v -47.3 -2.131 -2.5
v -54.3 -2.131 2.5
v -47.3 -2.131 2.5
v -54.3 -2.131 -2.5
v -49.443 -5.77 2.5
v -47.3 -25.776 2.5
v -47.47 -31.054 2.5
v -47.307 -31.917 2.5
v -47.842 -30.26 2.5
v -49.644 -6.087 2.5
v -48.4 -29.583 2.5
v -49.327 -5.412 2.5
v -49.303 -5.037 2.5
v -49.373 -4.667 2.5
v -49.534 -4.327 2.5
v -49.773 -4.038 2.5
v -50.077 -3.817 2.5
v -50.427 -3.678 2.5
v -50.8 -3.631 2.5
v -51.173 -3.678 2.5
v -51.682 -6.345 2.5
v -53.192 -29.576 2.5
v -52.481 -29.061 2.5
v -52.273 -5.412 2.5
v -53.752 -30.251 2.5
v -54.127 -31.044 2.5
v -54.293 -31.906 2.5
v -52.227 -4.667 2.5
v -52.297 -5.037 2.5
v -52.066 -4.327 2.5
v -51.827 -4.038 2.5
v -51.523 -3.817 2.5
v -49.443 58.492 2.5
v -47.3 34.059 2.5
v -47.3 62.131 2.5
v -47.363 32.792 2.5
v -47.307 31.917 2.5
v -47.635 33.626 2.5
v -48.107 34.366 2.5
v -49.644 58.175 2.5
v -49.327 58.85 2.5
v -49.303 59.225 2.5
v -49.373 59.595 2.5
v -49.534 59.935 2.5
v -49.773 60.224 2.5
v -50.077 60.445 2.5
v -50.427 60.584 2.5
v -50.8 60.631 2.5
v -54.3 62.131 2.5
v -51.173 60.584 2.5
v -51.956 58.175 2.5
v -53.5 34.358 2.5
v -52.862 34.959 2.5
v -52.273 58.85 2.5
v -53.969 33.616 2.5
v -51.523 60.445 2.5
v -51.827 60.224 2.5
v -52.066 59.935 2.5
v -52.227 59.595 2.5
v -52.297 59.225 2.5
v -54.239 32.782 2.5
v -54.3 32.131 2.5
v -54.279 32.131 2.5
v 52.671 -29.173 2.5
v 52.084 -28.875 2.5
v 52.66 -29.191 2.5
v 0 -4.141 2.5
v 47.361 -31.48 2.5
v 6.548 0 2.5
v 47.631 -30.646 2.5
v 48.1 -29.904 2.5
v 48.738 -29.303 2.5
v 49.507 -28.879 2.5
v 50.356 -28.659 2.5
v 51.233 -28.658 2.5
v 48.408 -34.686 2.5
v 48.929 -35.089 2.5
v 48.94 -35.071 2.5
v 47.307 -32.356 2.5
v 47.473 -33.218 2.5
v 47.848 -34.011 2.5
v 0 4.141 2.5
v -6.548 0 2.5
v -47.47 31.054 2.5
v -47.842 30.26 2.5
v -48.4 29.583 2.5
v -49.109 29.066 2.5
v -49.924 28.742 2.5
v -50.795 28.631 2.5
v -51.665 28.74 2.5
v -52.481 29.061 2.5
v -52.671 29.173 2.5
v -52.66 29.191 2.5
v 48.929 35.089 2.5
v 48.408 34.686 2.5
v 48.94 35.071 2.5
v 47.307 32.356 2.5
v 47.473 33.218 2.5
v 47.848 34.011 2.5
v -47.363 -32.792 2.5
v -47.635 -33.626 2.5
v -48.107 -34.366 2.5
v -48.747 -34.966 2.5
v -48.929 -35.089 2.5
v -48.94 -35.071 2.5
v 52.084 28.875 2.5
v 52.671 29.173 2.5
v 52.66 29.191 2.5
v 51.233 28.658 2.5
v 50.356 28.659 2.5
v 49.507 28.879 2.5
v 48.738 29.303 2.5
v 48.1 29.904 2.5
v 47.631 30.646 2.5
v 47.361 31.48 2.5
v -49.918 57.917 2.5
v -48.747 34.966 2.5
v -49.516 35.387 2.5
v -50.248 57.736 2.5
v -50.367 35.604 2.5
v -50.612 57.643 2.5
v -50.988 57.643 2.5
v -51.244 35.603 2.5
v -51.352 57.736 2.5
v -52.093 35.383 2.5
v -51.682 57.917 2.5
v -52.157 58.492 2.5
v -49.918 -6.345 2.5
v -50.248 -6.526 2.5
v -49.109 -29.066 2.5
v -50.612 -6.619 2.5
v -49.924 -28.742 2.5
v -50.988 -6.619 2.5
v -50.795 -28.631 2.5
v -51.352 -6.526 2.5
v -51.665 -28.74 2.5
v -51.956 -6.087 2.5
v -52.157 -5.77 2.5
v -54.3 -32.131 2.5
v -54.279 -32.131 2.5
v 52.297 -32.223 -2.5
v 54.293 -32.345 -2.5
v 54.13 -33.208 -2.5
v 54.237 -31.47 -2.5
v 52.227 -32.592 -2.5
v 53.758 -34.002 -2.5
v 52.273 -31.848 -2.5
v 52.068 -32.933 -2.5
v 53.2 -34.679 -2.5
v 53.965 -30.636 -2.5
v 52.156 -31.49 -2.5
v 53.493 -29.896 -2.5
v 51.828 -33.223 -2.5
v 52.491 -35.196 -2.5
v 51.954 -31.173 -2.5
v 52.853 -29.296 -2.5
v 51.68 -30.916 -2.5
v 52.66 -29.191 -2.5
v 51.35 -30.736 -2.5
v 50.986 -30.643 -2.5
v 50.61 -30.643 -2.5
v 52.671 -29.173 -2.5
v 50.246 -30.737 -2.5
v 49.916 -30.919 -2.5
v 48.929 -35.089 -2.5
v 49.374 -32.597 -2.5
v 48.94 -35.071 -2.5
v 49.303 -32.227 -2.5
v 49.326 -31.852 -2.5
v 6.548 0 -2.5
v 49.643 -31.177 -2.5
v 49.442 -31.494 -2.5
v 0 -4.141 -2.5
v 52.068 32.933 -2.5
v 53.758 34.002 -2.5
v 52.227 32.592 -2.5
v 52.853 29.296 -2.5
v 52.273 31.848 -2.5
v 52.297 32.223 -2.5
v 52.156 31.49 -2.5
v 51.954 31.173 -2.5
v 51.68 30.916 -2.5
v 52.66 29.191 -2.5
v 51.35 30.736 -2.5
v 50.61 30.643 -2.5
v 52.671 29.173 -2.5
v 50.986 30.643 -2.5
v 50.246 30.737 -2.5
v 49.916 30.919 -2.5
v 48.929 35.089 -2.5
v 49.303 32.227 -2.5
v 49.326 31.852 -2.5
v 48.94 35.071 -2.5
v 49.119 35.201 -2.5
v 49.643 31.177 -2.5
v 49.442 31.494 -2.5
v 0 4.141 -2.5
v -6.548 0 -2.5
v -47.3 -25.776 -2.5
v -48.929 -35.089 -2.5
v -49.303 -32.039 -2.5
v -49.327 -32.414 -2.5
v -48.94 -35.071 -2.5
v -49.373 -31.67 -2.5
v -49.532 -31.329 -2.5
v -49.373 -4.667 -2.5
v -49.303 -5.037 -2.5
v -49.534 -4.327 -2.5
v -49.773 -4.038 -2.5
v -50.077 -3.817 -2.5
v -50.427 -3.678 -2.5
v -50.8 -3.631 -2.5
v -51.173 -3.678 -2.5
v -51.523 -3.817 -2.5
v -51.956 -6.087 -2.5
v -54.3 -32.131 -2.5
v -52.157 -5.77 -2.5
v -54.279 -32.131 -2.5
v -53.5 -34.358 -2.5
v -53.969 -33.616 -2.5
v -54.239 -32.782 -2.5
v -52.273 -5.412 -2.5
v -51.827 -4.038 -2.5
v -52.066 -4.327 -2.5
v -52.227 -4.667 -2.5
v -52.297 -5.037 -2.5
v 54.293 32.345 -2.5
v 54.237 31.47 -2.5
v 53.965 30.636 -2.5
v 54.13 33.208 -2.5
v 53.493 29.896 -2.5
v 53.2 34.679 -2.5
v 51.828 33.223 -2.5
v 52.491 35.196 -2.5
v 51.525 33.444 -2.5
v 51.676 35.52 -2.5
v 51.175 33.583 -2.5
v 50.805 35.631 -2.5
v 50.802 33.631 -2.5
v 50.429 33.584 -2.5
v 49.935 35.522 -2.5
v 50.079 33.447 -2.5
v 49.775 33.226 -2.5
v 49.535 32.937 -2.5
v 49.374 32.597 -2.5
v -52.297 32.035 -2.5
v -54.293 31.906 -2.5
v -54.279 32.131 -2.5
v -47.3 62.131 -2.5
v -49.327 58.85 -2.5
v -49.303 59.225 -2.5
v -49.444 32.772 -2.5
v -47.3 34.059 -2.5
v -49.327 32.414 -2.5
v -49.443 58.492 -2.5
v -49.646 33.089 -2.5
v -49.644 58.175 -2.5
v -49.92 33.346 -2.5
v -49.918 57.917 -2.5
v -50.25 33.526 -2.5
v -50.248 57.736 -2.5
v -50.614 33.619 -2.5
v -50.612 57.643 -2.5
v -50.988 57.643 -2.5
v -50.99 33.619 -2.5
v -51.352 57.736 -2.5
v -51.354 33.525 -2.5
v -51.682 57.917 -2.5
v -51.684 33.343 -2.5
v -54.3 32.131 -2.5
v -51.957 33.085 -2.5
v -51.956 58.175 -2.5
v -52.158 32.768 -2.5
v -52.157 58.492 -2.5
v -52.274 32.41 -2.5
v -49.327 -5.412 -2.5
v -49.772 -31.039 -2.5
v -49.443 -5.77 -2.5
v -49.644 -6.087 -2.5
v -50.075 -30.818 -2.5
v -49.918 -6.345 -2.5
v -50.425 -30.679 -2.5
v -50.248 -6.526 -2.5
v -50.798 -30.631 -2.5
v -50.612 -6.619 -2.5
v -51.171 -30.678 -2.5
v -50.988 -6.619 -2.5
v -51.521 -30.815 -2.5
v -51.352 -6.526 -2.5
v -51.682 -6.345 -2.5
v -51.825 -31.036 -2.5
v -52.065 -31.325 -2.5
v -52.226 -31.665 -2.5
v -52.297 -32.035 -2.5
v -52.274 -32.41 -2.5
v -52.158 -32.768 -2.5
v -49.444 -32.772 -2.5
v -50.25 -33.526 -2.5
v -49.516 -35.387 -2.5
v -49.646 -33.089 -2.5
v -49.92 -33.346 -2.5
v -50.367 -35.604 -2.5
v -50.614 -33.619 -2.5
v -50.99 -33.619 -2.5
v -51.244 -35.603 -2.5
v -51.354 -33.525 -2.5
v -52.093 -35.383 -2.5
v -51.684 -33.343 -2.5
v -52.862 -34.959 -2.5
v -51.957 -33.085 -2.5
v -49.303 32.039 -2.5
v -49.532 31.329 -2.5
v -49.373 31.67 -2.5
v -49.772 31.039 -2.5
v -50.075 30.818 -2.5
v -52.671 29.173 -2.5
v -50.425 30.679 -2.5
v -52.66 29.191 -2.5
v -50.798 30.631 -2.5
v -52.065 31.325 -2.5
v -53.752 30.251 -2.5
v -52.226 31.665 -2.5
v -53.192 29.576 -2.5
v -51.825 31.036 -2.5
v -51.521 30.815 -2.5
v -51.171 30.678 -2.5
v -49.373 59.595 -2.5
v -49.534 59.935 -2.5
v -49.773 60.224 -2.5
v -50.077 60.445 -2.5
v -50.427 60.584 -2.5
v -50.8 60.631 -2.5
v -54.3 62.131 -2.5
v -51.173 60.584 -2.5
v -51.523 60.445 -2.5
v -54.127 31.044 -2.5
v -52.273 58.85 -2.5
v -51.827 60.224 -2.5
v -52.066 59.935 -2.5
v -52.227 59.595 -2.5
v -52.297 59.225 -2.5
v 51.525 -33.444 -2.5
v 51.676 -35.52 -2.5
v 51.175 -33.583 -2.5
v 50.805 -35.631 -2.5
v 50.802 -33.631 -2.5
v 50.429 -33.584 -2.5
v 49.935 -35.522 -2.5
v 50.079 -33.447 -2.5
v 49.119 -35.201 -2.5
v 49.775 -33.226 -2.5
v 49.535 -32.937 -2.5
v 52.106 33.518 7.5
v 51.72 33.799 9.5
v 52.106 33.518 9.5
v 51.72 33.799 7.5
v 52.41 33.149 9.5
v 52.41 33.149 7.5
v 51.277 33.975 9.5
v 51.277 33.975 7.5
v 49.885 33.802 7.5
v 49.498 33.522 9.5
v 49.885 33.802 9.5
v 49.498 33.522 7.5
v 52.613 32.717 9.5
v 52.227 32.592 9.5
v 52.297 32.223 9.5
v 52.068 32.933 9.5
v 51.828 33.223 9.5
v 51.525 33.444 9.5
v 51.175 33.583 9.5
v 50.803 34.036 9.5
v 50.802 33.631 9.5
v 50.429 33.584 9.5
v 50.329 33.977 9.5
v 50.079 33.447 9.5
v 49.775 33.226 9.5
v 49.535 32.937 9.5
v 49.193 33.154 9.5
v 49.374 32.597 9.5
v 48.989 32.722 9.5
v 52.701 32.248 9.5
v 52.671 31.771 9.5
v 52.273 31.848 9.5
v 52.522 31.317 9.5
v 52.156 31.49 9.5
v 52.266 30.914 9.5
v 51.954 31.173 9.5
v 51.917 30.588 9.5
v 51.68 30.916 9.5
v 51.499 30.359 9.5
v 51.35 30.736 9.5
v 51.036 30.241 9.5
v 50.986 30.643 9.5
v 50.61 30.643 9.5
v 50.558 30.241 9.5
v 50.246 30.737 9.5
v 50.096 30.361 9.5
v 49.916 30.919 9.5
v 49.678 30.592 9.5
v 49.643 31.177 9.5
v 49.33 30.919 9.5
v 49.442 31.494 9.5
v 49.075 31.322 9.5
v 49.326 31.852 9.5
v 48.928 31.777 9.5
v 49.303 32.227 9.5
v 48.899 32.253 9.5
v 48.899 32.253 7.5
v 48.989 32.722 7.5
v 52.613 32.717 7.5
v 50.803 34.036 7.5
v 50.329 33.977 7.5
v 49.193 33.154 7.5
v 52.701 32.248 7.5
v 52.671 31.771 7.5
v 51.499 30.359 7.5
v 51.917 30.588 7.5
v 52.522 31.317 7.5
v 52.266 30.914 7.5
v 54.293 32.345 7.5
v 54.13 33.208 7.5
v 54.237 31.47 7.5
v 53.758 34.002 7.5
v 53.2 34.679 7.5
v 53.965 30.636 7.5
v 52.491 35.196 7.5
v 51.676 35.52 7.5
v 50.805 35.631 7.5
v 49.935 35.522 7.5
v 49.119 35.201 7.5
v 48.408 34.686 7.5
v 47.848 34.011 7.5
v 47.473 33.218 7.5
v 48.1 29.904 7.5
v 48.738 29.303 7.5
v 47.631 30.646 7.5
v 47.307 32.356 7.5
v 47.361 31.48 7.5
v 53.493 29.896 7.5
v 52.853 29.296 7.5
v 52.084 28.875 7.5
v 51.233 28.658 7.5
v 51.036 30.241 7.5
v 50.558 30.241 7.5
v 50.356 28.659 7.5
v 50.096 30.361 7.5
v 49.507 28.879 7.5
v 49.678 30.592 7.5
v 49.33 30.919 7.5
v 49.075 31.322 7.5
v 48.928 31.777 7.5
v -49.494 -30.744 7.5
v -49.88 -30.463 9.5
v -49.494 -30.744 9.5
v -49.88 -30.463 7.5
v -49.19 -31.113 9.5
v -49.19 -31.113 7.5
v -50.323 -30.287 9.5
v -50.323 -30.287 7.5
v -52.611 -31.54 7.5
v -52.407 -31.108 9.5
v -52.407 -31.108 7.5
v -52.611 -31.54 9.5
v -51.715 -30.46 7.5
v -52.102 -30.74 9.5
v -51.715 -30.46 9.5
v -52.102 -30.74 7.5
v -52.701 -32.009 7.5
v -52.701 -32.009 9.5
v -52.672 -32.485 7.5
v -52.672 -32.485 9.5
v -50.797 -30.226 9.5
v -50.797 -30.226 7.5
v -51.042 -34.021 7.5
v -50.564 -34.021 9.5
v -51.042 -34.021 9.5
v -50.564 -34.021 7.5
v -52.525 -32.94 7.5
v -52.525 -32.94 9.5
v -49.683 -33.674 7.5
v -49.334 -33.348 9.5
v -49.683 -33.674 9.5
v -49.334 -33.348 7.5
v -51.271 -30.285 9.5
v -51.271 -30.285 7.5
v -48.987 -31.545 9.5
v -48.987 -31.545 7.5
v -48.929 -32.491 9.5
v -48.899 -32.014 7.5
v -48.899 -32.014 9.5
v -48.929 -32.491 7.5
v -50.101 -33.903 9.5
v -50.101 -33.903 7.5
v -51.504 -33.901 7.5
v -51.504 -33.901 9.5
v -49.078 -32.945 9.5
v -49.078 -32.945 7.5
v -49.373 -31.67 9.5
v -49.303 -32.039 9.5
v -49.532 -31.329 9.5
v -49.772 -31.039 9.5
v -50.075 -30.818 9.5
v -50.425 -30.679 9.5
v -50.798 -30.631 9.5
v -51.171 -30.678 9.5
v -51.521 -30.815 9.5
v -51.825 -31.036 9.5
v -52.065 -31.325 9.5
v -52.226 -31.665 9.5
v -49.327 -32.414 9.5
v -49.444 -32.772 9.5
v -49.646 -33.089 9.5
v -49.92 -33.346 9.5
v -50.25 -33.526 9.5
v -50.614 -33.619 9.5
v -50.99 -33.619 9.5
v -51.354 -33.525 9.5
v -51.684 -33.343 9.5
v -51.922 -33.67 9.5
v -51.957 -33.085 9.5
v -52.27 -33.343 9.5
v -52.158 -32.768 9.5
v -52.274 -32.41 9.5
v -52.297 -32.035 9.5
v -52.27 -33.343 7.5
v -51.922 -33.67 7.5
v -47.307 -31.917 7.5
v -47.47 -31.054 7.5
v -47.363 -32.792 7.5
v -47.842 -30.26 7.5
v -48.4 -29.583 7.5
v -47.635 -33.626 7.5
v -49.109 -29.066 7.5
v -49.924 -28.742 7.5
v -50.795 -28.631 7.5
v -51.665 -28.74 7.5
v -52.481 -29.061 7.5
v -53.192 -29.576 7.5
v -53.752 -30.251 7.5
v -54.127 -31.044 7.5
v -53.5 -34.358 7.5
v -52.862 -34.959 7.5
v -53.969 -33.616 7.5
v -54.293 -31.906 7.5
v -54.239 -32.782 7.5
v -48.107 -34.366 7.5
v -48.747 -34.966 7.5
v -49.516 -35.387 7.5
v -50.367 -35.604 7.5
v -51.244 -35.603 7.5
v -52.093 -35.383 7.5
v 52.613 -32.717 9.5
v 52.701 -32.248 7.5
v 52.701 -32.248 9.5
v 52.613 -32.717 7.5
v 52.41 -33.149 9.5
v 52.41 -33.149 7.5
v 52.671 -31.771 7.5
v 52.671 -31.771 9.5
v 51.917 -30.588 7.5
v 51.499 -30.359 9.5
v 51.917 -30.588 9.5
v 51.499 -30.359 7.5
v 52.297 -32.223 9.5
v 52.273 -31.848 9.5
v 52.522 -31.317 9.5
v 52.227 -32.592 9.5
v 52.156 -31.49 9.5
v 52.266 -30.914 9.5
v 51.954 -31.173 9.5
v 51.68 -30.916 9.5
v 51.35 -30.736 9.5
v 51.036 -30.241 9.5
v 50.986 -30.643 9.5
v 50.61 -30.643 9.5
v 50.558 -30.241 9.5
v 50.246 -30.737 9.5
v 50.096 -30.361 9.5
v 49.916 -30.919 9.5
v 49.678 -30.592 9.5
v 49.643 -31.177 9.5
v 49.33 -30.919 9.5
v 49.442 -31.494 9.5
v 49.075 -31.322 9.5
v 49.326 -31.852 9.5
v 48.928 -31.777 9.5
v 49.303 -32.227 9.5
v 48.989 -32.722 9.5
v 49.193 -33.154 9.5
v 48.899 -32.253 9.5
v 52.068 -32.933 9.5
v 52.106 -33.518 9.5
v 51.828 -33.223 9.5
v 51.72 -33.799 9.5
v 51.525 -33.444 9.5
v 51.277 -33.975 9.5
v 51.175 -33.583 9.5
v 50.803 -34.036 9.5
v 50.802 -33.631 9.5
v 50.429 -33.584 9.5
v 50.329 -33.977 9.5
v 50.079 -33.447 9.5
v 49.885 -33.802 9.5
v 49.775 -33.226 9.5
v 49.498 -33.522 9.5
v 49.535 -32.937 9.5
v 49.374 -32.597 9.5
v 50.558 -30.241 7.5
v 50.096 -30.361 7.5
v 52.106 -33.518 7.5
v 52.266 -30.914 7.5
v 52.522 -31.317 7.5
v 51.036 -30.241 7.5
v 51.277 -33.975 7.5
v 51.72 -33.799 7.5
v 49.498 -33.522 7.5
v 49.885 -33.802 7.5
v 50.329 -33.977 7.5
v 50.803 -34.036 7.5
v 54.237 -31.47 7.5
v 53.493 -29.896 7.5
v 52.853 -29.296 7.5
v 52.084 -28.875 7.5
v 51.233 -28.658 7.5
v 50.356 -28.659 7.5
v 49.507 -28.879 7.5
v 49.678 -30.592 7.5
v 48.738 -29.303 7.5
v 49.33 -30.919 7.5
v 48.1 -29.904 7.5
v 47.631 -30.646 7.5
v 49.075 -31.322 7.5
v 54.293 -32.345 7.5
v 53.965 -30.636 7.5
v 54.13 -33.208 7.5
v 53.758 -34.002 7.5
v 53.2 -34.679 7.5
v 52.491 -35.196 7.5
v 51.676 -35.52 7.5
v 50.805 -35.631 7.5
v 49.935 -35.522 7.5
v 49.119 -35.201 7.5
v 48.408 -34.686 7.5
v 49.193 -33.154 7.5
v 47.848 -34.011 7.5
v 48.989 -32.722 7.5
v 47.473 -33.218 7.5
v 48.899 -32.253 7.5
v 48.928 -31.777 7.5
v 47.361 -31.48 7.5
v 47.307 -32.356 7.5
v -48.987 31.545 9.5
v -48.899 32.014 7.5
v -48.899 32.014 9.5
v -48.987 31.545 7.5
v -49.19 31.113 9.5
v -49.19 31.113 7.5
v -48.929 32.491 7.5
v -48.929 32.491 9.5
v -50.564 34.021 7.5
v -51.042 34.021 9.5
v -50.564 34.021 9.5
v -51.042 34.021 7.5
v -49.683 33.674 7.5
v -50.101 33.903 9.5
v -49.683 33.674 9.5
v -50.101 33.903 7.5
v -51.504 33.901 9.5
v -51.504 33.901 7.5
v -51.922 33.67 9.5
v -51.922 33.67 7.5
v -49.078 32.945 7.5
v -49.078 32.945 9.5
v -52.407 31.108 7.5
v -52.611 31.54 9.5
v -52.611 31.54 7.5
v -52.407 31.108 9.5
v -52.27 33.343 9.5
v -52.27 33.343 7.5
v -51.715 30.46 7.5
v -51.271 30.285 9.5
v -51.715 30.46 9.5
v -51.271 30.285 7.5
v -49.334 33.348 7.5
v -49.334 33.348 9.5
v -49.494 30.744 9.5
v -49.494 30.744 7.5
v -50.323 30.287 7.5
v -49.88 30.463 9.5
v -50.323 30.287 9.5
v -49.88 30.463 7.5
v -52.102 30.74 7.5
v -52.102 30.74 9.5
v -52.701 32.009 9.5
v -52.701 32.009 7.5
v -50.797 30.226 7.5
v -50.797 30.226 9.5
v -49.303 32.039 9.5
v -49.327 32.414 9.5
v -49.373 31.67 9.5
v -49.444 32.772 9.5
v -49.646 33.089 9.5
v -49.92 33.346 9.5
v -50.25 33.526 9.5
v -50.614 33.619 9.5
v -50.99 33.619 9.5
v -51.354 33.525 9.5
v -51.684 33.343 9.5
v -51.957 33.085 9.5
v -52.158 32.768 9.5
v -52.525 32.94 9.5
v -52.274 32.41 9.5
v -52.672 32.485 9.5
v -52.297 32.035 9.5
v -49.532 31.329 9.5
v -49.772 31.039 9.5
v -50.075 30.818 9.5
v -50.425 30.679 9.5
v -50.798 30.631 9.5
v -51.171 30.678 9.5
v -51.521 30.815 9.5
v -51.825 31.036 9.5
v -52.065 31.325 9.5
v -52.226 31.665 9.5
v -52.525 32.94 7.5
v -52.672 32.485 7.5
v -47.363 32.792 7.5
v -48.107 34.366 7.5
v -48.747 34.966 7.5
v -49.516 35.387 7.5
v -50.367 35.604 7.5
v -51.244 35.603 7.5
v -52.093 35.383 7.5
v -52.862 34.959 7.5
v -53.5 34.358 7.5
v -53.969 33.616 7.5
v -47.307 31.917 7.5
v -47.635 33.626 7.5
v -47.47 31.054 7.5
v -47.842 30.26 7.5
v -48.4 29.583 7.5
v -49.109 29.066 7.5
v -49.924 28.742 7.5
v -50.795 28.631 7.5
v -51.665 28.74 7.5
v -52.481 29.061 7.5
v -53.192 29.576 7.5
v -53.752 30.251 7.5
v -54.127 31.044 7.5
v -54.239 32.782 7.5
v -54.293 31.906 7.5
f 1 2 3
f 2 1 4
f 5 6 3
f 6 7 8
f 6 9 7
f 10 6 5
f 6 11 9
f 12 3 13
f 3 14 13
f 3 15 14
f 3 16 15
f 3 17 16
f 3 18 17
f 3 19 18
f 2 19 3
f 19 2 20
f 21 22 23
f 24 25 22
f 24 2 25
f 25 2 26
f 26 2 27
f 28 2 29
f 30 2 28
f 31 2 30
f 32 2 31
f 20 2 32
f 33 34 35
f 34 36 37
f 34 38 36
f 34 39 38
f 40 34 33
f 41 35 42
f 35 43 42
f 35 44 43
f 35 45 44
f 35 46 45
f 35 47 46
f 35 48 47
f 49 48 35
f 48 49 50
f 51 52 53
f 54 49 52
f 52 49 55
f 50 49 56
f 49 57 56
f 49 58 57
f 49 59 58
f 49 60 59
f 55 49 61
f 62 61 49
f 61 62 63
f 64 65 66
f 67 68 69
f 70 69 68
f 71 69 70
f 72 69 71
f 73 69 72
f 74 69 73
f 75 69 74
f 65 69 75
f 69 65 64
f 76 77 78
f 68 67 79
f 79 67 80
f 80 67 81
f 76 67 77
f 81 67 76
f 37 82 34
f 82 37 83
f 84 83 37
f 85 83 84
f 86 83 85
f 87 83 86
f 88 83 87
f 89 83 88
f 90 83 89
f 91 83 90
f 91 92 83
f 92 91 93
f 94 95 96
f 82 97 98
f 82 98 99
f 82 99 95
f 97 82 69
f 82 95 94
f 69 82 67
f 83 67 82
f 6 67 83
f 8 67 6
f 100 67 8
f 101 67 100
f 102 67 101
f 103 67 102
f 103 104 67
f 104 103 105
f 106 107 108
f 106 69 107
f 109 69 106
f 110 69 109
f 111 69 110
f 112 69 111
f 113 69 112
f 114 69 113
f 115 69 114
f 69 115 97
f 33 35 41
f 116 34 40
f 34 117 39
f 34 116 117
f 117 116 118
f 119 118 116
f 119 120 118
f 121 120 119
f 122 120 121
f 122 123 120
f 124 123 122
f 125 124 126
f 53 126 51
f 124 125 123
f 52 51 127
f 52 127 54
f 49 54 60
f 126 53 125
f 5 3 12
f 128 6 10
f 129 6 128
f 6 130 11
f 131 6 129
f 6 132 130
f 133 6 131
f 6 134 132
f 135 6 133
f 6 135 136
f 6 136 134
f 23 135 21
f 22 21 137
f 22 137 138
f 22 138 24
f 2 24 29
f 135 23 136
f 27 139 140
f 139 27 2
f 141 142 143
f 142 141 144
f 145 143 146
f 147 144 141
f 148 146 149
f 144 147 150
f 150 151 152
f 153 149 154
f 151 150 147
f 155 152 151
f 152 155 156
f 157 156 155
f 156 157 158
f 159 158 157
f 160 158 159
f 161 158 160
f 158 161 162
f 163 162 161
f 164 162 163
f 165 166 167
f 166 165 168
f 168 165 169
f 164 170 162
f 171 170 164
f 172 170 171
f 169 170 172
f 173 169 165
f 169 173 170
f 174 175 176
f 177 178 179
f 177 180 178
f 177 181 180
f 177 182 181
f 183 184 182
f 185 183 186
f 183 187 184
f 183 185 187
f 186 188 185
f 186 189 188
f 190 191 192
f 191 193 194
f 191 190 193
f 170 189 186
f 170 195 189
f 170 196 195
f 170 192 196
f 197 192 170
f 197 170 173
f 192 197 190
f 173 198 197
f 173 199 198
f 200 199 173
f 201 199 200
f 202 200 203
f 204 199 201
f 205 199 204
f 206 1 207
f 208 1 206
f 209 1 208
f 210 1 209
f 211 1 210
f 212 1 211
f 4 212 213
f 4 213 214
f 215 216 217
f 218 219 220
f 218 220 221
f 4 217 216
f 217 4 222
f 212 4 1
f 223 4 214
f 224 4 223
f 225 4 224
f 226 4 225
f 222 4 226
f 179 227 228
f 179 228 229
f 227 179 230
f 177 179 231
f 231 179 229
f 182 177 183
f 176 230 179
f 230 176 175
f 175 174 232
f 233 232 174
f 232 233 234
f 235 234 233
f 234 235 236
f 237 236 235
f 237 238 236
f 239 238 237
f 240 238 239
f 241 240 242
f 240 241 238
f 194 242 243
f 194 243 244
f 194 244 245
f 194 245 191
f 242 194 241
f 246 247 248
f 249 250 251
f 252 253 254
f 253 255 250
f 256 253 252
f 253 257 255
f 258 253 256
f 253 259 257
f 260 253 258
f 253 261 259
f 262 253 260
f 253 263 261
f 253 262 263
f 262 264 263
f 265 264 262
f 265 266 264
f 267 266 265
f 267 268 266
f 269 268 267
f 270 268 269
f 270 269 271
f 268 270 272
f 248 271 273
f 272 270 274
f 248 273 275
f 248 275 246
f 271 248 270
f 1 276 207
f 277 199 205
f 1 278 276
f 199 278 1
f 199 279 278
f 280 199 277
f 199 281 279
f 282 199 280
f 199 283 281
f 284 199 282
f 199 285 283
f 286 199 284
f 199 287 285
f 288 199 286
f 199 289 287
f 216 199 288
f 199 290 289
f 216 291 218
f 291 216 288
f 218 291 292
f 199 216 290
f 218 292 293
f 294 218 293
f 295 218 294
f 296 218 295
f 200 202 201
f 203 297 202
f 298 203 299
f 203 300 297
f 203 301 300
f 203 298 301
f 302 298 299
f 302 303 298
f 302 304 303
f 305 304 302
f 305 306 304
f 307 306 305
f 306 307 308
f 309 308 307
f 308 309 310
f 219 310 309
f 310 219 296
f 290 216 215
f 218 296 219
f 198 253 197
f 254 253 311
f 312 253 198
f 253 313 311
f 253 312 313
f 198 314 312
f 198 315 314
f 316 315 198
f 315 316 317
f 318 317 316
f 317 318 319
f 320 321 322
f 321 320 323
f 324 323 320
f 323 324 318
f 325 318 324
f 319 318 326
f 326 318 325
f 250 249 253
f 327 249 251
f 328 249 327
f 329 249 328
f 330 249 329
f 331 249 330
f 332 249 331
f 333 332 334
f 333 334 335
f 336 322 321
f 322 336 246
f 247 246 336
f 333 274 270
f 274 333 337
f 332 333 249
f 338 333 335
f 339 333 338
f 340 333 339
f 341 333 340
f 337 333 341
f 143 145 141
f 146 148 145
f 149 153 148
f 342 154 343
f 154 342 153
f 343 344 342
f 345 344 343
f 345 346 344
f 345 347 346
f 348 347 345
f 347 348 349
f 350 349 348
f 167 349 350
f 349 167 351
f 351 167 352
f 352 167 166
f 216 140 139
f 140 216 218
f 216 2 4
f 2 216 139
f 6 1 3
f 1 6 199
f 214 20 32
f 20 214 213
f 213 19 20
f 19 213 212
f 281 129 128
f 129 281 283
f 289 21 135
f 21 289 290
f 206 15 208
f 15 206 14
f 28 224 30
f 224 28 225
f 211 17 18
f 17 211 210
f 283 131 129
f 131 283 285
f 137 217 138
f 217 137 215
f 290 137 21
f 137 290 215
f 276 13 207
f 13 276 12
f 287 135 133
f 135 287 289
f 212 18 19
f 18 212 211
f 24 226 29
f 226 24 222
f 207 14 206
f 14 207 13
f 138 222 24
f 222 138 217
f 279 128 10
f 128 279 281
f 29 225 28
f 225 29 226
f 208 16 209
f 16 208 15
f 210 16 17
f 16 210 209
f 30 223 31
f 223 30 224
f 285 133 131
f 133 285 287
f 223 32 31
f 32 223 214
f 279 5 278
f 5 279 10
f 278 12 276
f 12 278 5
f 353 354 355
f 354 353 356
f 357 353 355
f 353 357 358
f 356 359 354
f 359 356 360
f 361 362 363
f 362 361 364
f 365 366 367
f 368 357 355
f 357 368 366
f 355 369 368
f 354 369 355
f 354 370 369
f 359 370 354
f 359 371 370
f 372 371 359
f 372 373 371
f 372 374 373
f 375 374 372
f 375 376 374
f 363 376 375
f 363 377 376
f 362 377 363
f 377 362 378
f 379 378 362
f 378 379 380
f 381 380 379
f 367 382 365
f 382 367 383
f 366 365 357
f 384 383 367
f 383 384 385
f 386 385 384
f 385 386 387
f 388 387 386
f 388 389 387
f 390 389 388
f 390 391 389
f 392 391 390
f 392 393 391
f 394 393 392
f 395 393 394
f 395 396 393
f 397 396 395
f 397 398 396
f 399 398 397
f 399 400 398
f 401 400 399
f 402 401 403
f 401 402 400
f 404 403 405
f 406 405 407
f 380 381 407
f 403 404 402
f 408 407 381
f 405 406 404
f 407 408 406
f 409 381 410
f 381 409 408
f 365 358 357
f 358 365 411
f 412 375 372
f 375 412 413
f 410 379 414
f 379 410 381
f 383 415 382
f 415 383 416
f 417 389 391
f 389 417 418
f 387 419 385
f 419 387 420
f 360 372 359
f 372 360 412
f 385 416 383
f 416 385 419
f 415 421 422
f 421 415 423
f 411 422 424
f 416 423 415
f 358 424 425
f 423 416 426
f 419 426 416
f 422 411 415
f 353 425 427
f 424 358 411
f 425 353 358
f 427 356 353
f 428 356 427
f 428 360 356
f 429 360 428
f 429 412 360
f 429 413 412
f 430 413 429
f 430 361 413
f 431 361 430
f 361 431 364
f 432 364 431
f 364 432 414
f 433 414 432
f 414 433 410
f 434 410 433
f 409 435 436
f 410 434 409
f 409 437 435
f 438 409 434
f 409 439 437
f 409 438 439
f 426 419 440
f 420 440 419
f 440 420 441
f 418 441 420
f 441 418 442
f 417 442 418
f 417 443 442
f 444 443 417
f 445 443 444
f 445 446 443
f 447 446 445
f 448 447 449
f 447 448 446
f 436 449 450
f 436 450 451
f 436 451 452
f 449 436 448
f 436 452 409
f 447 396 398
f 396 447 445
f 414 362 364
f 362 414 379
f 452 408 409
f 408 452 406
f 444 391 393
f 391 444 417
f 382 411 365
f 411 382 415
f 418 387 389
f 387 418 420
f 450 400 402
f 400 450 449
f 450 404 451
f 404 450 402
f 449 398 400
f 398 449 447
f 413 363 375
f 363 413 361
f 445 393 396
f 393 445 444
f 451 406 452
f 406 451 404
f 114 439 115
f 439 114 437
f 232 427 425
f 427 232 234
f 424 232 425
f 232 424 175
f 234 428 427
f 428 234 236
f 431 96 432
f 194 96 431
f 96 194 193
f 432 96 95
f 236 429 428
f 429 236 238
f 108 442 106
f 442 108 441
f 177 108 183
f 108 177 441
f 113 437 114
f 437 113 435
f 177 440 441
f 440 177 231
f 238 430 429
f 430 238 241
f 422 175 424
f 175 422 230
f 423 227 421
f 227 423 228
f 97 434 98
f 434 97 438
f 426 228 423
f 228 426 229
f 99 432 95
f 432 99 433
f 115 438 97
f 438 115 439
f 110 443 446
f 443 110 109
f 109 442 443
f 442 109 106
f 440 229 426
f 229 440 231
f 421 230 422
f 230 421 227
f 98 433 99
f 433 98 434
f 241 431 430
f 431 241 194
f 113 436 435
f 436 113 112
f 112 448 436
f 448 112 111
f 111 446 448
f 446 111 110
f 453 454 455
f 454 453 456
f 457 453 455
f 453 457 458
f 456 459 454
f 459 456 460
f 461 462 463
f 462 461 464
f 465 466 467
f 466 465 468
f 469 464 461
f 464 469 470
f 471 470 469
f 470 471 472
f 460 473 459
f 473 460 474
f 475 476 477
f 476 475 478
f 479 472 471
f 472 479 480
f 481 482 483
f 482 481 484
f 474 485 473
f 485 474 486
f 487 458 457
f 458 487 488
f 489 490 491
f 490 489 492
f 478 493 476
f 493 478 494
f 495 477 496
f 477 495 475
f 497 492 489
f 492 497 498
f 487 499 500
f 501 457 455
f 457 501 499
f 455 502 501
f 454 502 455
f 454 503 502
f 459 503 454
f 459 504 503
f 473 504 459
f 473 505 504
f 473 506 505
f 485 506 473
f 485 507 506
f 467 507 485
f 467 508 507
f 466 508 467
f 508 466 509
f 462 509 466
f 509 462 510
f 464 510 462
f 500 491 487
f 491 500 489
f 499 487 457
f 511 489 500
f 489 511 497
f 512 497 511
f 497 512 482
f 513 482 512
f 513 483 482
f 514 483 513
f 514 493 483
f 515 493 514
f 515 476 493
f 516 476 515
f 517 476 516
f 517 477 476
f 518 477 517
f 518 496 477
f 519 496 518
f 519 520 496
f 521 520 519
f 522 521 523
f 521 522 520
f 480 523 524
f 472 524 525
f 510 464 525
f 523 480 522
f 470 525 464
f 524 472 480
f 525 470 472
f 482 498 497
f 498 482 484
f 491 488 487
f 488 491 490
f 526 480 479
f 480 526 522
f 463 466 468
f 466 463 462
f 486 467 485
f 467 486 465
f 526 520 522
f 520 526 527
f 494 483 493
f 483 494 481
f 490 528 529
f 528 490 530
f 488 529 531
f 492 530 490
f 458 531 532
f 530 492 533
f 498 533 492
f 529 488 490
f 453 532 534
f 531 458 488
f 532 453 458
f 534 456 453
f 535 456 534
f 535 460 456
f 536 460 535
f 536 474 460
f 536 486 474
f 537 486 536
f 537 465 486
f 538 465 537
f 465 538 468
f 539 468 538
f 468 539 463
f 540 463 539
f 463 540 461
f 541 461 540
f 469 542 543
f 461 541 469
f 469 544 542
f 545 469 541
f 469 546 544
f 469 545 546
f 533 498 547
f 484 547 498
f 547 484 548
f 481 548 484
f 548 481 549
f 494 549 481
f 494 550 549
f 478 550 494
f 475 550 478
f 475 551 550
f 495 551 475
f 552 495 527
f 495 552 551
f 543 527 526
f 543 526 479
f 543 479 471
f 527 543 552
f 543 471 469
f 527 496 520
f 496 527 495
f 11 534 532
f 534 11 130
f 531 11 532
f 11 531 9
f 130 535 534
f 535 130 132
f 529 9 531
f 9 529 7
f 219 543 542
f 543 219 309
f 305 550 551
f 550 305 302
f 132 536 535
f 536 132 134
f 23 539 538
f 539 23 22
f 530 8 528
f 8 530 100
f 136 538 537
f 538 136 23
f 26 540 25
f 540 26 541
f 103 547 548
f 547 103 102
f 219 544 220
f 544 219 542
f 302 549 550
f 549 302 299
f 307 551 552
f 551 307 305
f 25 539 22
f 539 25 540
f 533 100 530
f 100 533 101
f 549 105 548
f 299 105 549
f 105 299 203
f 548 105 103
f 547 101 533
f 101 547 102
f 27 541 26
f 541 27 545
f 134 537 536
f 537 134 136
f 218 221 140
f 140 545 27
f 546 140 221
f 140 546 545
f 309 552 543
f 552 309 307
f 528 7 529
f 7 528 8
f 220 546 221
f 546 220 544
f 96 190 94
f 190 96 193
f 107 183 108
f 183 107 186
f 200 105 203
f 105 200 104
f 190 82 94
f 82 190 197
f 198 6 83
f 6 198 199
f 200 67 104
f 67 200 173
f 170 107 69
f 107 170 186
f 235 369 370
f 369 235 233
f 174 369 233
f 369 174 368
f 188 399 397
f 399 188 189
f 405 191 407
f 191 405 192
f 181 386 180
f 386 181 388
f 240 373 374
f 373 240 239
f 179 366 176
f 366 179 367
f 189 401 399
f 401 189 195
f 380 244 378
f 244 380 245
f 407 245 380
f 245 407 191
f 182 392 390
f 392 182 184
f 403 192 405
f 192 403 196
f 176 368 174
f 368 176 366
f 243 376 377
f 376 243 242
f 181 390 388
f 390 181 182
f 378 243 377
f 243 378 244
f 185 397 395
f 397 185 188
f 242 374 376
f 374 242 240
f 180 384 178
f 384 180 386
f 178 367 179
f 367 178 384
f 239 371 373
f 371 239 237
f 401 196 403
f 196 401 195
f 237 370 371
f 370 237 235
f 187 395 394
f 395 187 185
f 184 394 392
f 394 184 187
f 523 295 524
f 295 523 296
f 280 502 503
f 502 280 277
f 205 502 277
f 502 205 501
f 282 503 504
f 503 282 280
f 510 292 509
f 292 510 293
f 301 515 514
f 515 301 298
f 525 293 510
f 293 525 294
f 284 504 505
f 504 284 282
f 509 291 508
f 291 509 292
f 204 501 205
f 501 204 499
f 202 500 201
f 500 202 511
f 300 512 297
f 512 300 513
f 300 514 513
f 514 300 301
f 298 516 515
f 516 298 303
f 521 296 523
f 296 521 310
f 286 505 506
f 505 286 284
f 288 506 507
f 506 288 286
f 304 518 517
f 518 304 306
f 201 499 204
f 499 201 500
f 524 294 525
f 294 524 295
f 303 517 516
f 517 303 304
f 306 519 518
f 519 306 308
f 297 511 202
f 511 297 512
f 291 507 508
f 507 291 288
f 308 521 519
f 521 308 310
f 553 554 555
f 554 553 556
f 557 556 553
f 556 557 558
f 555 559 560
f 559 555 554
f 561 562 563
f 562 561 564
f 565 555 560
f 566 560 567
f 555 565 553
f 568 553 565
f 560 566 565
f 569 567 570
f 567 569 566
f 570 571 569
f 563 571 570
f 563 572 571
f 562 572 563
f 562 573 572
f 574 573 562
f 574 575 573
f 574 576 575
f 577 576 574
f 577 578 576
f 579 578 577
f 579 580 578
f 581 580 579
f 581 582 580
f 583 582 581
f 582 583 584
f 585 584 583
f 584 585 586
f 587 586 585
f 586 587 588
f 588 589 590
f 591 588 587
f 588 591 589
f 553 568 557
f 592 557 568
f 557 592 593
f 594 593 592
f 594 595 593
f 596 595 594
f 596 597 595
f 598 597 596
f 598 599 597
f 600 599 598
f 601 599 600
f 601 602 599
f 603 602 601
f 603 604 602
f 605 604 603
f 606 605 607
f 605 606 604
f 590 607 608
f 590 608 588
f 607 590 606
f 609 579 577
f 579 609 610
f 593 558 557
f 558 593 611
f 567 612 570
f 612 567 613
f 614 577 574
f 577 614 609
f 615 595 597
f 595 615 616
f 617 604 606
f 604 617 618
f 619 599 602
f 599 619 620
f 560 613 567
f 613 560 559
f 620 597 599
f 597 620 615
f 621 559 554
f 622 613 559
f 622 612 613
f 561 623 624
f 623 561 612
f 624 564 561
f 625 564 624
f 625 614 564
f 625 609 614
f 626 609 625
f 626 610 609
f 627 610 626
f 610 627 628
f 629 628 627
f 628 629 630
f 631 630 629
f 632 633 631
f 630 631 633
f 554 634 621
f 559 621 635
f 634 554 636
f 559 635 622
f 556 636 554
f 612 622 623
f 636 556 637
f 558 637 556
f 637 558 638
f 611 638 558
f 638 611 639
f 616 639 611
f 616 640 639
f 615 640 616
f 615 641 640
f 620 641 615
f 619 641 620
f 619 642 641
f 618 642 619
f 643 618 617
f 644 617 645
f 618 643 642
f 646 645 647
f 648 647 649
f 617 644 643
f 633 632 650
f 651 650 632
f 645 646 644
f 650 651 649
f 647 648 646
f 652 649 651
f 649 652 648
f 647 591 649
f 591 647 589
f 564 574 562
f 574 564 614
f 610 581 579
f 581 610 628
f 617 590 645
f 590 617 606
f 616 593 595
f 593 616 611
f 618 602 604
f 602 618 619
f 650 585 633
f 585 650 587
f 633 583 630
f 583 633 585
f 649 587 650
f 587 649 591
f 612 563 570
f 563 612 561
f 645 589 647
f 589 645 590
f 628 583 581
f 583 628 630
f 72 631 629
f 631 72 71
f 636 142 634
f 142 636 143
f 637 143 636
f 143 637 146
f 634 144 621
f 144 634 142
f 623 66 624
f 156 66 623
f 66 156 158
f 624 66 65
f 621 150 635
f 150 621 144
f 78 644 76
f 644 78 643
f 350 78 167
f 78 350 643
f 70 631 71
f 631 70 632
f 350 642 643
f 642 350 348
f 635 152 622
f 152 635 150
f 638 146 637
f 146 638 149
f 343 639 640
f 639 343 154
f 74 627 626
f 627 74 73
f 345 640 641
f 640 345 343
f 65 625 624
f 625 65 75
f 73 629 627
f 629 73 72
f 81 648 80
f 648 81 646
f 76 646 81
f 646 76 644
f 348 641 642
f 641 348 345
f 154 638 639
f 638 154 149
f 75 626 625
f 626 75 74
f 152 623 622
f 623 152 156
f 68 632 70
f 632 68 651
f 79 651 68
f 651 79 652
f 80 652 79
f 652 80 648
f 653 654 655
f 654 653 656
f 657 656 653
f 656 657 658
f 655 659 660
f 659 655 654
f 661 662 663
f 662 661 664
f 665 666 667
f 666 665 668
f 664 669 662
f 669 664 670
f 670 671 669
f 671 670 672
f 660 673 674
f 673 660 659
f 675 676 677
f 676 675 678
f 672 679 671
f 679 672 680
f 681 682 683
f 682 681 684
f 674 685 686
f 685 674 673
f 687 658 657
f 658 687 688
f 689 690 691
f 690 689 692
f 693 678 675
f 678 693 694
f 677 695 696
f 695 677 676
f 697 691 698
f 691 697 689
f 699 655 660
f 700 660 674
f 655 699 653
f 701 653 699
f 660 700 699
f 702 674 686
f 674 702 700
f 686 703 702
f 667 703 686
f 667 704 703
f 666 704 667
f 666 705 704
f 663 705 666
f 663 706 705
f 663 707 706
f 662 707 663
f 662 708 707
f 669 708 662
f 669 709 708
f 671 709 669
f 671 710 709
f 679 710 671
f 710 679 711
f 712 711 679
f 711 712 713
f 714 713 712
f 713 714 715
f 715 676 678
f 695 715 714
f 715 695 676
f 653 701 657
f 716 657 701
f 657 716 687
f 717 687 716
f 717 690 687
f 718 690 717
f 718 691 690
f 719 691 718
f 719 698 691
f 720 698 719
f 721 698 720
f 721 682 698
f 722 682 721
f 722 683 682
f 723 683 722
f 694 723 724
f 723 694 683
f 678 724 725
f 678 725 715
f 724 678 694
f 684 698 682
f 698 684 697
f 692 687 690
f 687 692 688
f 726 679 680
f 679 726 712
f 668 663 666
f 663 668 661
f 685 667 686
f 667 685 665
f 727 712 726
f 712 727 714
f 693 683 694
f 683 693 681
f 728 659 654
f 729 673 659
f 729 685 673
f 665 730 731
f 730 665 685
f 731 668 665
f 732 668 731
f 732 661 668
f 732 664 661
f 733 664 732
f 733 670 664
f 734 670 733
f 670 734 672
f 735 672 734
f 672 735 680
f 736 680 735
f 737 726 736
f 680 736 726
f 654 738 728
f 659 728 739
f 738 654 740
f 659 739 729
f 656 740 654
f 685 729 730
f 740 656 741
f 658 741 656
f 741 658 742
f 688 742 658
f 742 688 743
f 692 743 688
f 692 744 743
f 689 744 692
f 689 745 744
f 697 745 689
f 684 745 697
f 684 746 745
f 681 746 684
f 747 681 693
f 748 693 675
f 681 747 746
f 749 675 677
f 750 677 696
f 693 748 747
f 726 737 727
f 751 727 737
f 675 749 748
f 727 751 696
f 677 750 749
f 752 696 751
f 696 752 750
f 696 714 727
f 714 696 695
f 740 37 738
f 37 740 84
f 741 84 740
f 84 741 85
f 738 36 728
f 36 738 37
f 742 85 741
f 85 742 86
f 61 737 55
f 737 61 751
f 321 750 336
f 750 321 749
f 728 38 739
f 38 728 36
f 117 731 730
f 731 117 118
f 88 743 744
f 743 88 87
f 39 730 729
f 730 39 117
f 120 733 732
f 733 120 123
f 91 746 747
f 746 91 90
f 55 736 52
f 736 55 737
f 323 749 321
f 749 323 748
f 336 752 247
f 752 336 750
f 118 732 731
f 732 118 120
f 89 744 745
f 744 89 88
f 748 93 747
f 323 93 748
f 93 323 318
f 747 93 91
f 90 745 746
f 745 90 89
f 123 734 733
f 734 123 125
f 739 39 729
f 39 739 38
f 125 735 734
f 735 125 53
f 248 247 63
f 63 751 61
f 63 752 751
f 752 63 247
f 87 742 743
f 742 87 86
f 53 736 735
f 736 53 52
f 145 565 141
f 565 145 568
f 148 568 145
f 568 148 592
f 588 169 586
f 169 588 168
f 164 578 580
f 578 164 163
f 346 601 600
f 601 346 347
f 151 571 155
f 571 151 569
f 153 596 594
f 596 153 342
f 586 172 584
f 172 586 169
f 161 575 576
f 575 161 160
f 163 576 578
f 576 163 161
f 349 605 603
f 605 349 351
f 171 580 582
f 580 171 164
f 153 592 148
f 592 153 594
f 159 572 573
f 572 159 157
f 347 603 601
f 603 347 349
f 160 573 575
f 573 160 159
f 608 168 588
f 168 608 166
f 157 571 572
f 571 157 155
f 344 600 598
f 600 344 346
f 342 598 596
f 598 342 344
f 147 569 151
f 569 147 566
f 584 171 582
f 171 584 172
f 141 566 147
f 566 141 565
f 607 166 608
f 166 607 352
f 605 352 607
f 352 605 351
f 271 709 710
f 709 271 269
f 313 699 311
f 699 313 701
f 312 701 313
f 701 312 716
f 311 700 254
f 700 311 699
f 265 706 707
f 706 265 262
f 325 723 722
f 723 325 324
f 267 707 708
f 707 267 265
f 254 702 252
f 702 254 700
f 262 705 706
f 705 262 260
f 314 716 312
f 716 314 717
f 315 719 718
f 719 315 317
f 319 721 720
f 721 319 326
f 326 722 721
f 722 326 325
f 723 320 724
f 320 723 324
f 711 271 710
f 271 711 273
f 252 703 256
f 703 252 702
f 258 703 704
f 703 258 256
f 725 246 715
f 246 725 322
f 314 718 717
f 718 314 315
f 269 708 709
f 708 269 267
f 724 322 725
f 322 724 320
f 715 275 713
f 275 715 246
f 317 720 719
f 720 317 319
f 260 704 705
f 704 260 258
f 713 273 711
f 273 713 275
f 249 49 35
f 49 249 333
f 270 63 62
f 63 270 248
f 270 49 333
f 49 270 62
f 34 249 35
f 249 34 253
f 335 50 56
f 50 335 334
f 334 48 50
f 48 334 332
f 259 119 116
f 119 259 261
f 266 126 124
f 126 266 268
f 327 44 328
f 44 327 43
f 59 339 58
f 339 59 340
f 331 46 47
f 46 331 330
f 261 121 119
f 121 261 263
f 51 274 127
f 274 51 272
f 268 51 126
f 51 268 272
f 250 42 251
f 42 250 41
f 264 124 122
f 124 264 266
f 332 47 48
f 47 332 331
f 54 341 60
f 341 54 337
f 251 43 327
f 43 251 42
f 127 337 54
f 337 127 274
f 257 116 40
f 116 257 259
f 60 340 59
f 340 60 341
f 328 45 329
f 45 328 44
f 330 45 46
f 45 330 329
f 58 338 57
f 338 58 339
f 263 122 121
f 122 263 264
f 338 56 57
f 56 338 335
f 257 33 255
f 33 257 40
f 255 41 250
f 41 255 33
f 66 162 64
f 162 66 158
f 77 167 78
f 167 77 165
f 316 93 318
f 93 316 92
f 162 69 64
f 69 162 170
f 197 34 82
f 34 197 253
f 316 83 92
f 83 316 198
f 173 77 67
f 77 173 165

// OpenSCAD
shortside=2.53*25.4;
longside=4*25.4;
holesize=.15*25.4;
postheight=2;
screwsize=3;
platethickness=5;
offsetheight=5+platethickness;
armwidth=7;
$fn=25;
diaglen=sqrt(pow(shortside,2)+pow(longside,2));
angle=atan((shortside/2)/(longside/2));

  for(a=[angle, -angle]) {
    rotate([0,0,a]) {
      difference() {
        union() {
          cube([diaglen,armwidth,platethickness], center=true);
          translate([-diaglen/2,0,0]) rotate([0,0,90-a]) translate([15,0,0])
             difference() {
             cube([30,armwidth, platethickness], center=true);
             translate([12,0,0]) cylinder(d=screwsize, h=platethickness+1, center=true);
            }
          for(b=[diaglen/2, -diaglen/2]) {
            translate([b, 0, platethickness/2+offsetheight/2+postheight/2]) cylinder(d=holesize, h=postheight, center=true);
            translate([b, 0,platethickness/2])cylinder(d=armwidth, h=offsetheight, center=true);

          }
        }
        for(b=[diaglen/2, -diaglen/2]) {
          translate([b,0,0]) cylinder(d=screwsize, h=offsetheight*2, center=true);
        }
      }
    }
  }
